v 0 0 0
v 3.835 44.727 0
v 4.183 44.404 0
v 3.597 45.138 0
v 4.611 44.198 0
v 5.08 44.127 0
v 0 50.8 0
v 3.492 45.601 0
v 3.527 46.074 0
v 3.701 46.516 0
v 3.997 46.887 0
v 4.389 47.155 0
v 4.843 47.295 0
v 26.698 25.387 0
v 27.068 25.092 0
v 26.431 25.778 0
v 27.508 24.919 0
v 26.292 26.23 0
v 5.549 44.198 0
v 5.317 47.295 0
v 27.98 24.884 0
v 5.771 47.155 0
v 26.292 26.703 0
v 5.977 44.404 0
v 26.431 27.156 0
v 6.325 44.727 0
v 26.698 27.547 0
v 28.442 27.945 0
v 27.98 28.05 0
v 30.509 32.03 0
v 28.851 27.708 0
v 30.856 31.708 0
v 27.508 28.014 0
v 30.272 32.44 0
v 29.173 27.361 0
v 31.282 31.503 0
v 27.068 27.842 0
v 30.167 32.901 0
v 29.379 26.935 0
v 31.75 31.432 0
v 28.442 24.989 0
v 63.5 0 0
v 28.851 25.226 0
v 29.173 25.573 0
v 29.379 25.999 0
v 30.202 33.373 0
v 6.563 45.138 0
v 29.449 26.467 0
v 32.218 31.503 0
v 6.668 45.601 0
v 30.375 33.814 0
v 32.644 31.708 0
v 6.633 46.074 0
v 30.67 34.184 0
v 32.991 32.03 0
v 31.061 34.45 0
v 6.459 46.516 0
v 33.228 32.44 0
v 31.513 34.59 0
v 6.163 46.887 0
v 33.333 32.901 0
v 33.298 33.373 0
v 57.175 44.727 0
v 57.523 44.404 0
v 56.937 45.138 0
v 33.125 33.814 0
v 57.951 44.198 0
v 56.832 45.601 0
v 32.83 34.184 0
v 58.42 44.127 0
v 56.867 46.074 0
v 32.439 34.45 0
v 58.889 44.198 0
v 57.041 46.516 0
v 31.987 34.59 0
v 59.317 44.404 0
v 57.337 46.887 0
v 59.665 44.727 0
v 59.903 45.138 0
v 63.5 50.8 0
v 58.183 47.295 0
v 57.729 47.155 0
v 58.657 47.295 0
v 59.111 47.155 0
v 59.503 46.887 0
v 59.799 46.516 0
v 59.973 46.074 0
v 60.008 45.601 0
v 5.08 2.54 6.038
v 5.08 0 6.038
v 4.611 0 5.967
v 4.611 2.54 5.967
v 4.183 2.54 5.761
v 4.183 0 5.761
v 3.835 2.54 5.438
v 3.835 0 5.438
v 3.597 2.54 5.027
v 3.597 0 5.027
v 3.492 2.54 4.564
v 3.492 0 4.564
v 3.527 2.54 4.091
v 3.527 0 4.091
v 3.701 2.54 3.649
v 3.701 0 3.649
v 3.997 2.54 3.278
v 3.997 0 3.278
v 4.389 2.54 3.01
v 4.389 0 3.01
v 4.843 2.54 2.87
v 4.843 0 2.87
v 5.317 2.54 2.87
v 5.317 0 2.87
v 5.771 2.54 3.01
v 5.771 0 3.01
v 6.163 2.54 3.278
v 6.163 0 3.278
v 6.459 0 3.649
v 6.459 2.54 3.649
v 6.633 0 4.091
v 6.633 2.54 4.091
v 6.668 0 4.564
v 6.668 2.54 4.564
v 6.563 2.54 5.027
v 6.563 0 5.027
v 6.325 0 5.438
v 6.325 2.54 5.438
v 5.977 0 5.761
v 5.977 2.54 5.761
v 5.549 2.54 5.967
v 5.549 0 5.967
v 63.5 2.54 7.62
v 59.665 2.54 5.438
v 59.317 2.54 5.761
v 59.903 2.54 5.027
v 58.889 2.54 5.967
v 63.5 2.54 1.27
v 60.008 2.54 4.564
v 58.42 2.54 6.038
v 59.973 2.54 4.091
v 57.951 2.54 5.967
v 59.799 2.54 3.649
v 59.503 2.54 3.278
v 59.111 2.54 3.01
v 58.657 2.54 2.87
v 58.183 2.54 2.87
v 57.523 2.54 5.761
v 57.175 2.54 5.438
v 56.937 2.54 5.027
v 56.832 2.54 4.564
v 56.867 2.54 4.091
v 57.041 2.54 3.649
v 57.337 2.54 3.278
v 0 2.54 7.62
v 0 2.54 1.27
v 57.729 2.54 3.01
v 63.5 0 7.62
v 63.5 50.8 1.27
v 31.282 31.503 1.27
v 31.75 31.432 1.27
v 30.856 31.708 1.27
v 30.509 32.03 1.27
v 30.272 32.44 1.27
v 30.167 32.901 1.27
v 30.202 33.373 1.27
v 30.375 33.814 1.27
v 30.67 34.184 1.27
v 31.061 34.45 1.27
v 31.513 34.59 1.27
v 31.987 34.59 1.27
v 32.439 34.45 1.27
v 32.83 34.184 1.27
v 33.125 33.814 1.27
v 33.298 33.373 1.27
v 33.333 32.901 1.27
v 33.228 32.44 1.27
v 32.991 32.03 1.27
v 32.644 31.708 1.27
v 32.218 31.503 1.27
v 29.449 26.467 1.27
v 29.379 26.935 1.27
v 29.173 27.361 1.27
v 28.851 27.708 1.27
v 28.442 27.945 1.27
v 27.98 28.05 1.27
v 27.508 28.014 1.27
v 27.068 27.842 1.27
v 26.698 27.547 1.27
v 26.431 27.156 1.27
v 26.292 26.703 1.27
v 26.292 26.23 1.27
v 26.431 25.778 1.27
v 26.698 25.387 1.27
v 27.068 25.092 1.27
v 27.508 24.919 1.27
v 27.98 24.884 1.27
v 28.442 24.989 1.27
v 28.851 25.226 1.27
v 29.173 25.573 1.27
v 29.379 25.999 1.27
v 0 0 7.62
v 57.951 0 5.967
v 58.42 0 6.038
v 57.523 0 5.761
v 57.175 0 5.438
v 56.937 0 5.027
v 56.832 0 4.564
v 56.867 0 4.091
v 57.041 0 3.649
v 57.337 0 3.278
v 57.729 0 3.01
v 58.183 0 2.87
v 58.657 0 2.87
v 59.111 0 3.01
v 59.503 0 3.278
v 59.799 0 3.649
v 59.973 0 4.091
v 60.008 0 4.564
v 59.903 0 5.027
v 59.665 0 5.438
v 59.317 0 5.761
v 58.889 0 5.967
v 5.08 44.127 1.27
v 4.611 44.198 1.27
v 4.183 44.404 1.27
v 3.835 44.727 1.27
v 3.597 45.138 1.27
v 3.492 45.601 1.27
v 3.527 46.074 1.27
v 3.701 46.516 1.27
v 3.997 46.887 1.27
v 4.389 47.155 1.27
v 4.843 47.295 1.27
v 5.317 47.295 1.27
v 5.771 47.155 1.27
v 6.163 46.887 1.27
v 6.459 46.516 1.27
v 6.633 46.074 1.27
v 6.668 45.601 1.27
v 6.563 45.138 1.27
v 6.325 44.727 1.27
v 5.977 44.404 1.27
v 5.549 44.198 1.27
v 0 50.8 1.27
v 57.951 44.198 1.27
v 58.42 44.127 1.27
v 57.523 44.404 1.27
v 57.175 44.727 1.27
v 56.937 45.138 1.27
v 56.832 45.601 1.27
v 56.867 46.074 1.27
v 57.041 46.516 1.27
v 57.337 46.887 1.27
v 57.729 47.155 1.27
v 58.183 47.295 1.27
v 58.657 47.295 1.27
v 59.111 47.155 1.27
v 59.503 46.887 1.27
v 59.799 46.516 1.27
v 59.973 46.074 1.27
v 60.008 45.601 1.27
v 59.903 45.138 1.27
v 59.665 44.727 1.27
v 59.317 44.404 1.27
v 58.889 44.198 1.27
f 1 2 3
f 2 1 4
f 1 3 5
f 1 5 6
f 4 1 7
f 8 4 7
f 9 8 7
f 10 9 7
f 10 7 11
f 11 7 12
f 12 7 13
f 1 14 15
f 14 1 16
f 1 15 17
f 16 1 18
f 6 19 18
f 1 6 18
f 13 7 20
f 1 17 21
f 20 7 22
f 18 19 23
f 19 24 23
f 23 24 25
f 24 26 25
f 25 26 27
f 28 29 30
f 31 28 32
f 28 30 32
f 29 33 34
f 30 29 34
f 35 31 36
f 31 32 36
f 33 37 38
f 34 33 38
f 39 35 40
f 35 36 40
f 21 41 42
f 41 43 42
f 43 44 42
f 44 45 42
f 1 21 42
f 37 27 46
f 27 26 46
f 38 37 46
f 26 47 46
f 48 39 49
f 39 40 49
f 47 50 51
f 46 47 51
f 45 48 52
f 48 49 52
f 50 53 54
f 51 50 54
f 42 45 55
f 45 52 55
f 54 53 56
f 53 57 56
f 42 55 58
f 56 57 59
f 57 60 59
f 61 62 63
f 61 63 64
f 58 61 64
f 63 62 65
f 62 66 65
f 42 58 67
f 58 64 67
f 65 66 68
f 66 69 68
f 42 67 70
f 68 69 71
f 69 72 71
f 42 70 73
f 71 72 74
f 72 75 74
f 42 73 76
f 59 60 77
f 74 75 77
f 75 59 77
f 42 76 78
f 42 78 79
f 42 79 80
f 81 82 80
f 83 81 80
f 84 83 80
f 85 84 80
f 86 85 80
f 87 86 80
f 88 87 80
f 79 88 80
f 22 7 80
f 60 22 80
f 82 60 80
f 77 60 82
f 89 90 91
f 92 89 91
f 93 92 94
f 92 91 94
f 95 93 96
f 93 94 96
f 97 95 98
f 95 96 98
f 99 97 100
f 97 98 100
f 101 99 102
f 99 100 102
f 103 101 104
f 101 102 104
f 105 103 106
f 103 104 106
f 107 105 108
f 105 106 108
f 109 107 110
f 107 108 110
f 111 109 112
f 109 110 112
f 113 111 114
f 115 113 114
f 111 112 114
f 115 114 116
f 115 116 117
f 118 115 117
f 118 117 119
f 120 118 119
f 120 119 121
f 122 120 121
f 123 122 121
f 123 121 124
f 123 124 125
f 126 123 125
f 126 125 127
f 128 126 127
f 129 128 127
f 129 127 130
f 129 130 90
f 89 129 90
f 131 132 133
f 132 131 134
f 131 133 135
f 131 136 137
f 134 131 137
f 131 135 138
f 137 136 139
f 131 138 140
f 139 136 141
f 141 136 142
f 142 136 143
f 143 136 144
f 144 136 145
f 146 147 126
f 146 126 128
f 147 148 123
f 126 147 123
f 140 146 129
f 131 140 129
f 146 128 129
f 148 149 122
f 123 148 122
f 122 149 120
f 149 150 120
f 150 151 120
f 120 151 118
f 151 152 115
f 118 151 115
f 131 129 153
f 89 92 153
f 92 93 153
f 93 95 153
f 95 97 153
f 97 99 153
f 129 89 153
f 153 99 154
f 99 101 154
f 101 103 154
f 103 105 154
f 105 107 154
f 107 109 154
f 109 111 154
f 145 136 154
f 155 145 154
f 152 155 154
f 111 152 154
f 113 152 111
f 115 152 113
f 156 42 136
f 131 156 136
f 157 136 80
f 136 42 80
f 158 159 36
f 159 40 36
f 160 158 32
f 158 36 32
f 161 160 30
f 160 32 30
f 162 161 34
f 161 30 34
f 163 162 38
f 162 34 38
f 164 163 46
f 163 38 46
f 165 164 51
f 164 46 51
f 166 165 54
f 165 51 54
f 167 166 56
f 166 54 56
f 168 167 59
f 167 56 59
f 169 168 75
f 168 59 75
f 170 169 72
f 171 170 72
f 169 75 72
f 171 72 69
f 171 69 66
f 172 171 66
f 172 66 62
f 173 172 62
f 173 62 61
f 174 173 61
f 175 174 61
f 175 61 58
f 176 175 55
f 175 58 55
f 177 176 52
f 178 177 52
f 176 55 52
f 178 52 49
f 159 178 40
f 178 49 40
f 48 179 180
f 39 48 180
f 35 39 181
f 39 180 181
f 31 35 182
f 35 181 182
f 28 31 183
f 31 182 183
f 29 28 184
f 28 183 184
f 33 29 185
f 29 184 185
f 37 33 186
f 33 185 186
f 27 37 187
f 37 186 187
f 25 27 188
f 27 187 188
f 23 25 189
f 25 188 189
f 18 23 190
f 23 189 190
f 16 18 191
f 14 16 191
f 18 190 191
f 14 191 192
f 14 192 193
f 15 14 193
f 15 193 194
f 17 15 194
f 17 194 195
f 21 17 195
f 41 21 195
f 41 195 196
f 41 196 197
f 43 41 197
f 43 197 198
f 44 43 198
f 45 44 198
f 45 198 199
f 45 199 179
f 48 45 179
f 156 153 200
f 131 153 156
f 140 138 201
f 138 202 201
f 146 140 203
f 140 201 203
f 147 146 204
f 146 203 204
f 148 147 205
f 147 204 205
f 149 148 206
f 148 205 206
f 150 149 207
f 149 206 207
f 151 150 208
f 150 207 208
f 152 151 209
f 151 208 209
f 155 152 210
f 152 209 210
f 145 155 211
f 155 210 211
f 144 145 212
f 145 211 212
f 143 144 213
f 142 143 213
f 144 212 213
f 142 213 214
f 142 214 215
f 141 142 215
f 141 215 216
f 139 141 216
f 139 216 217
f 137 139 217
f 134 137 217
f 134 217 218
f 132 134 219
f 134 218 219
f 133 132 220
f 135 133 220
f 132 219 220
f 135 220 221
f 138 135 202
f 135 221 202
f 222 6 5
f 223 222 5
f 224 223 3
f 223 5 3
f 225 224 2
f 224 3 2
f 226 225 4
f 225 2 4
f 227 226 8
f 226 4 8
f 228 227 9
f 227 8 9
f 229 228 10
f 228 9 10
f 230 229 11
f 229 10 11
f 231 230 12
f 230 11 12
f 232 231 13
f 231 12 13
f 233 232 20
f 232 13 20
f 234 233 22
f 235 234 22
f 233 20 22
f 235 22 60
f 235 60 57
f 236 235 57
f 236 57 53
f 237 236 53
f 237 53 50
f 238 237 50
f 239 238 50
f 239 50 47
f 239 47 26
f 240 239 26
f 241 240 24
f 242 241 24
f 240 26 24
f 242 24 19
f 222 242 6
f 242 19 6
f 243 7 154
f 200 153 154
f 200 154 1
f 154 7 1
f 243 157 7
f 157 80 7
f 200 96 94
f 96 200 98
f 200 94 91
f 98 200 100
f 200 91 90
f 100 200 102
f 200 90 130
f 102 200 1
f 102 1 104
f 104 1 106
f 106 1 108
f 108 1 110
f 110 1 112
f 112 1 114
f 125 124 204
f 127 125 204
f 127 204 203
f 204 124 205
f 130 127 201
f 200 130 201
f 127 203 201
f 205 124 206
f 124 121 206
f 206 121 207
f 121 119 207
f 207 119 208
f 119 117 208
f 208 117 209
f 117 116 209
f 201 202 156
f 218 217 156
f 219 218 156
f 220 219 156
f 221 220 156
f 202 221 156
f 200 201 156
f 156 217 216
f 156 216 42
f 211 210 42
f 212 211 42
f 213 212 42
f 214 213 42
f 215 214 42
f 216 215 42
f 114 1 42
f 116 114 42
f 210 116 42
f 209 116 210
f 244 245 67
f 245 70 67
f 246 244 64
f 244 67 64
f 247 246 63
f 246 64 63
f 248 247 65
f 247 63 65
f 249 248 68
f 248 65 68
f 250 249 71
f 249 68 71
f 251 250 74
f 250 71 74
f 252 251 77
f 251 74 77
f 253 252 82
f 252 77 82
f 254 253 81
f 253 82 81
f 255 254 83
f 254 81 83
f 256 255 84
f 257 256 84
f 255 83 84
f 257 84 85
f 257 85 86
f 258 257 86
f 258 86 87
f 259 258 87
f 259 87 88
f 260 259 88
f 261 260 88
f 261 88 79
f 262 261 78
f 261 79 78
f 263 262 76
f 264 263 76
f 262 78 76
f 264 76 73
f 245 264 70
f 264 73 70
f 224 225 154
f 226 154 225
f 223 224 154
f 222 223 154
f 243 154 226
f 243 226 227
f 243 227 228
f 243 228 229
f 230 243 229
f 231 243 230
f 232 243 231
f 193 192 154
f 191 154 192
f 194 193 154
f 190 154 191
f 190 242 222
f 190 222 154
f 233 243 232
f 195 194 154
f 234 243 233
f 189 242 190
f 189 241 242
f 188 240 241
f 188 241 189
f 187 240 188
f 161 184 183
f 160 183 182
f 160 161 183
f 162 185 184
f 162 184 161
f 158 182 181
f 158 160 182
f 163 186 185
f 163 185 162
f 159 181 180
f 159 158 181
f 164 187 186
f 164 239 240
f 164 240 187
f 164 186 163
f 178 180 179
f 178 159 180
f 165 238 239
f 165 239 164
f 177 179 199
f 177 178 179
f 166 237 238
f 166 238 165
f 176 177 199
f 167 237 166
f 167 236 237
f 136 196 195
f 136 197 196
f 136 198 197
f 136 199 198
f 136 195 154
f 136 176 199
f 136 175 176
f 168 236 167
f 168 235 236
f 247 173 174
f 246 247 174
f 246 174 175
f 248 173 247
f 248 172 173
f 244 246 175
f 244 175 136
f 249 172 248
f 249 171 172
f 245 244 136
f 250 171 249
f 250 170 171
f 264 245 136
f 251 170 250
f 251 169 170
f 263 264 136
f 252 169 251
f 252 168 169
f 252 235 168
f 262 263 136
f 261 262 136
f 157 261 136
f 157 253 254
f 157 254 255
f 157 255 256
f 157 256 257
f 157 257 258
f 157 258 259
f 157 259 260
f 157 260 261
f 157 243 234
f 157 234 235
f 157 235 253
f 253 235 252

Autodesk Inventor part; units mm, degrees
ref_plane "YZ Plane" through (0, 0, 0) normal (1, 0, 0) x (0, 1, 0)
ref_plane "XZ Plane" through (0, 0, 0) normal (0, 1, 0) x (-1, 0, 0)
ref_plane "XY Plane" through (0, 0, 0) normal (0, 0, 1) x (1, 0, 0)
sketch "Sketch1" plane through (0, 0, 0) normal (0, 0, 1) x (1, 0, 0)
  line L0 (0, 0) -> (63.5, 0)
  line L1 (63.5, 0) -> (63.5, 50.8)
  line L2 (63.5, 50.8) -> (0, 50.8)
  line L3 (0, 50.8) -> (0, 0)
  dimension "d0" = 50.8
  dimension "d1" = 63.5
extrude "Extrusion1" add sketch "Sketch1" along normal blind 1.27
sketch "Sketch2" plane through (0, 0, 1.27) normal (0, 0, 1) x (1, 0, 0)
  line L0 (63.5, 0) -> (63.5, 50.8) projected
  line L1 (0, 0) -> (63.5, 0)
  line L2 (63.5, 0) -> (63.5, 2.54)
  line L3 (63.5, 2.54) -> (0, 2.54)
  line L4 (0, 2.54) -> (0, 0)
  dimension "d4" = 2.54
extrude "Extrusion2" add sketch "Sketch2" along normal blind 6.35
sketch "Sketch3" plane through (0, 0, 1.27) normal (0, 0, 1) x (1, 0, 0)
  line L0 (63.5, 50.8) -> (0, 50.8) projected
  line L1 (63.5, 2.54) -> (63.5, 50.8) projected
  point P0 (0, 0)
  point P1 (31.75, 33.02)
  dimension "d7" = 17.78
  dimension "d8" = 31.75
hole "Hole1" at (31.75, 33.02, 1.27) direction (0, 0, -1) diameter 3.175 depth 25.4 tip angle 118
sketch "Sketch4" plane through (0, 0, 1.27) normal (0, 0, 1) x (1, 0, 0)
  line L0 (0, 50.8) -> (0, 2.54) projected
  line L1 (63.5, 2.54) -> (63.5, 50.8) projected
  line L2 (63.5, 50.8) -> (0, 50.8) projected
  point P0 (0, 0)
  point P1 (5.08, 45.72)
  point P2 (58.42, 45.72)
  dimension "d16" = 5.08
  dimension "d17" = 5.08
  dimension "d18" = 5.08
  dimension "d19" = 5.08
hole "Hole2" at (5.08, 45.72, 1.27) at (58.42, 45.72, 1.27) direction (0, 0, -1) diameter 3.1852 depth 25.4 tip angle 118
sketch "Sketch5" plane through (0, 2.54, 1.27) normal (0, 1, 0) x (1, 0, 0)
  line L0 (63.5, -6.35) -> (0, -6.35) projected
  line L1 (0, 0) -> (0, -6.35) projected
  line L2 (63.5, 0) -> (63.5, -6.35) projected
  point P0 (0, 1.27)
  point P1 (5.08, -3.175)
  point P2 (58.42, -3.175)
  dimension "d27" = 3.175
  dimension "d28" = 5.08
  dimension "d29" = 3.175
  dimension "d30" = 5.08
hole "Hole3" at (5.08, 2.54, 4.445) at (58.42, 2.54, 4.445) direction (0, -1, 0) diameter 3.1852 depth 25.4 tip angle 118
sketch "Sketch6" plane through (0, 0, 1.27) normal (0, 0, 1) x (1, 0, 0)
  circle A0 centre (31.75, 33.02) radius 1.5875 construction
  circle A1 centre (31.75, 33.02) radius 3.81 construction
  circle A2 centre (27.8616, 26.4668) radius 3.81 construction
  line L0 (63.5, 2.54) -> (0, 2.54) construction
  circle A3 centre (27.8616, 26.4668) radius 1.5875
  line L1 (0, 0) -> (63.5, 0) projected
  dimension "d39" = 7.62
  dimension "d40" = 7.62
  dimension "d42" = 3.175
  dimension "d47" = 26.4668
extrude "Extrusion3" cut sketch "Sketch6" against normal blind 25.4
properties part number "000110-1"
